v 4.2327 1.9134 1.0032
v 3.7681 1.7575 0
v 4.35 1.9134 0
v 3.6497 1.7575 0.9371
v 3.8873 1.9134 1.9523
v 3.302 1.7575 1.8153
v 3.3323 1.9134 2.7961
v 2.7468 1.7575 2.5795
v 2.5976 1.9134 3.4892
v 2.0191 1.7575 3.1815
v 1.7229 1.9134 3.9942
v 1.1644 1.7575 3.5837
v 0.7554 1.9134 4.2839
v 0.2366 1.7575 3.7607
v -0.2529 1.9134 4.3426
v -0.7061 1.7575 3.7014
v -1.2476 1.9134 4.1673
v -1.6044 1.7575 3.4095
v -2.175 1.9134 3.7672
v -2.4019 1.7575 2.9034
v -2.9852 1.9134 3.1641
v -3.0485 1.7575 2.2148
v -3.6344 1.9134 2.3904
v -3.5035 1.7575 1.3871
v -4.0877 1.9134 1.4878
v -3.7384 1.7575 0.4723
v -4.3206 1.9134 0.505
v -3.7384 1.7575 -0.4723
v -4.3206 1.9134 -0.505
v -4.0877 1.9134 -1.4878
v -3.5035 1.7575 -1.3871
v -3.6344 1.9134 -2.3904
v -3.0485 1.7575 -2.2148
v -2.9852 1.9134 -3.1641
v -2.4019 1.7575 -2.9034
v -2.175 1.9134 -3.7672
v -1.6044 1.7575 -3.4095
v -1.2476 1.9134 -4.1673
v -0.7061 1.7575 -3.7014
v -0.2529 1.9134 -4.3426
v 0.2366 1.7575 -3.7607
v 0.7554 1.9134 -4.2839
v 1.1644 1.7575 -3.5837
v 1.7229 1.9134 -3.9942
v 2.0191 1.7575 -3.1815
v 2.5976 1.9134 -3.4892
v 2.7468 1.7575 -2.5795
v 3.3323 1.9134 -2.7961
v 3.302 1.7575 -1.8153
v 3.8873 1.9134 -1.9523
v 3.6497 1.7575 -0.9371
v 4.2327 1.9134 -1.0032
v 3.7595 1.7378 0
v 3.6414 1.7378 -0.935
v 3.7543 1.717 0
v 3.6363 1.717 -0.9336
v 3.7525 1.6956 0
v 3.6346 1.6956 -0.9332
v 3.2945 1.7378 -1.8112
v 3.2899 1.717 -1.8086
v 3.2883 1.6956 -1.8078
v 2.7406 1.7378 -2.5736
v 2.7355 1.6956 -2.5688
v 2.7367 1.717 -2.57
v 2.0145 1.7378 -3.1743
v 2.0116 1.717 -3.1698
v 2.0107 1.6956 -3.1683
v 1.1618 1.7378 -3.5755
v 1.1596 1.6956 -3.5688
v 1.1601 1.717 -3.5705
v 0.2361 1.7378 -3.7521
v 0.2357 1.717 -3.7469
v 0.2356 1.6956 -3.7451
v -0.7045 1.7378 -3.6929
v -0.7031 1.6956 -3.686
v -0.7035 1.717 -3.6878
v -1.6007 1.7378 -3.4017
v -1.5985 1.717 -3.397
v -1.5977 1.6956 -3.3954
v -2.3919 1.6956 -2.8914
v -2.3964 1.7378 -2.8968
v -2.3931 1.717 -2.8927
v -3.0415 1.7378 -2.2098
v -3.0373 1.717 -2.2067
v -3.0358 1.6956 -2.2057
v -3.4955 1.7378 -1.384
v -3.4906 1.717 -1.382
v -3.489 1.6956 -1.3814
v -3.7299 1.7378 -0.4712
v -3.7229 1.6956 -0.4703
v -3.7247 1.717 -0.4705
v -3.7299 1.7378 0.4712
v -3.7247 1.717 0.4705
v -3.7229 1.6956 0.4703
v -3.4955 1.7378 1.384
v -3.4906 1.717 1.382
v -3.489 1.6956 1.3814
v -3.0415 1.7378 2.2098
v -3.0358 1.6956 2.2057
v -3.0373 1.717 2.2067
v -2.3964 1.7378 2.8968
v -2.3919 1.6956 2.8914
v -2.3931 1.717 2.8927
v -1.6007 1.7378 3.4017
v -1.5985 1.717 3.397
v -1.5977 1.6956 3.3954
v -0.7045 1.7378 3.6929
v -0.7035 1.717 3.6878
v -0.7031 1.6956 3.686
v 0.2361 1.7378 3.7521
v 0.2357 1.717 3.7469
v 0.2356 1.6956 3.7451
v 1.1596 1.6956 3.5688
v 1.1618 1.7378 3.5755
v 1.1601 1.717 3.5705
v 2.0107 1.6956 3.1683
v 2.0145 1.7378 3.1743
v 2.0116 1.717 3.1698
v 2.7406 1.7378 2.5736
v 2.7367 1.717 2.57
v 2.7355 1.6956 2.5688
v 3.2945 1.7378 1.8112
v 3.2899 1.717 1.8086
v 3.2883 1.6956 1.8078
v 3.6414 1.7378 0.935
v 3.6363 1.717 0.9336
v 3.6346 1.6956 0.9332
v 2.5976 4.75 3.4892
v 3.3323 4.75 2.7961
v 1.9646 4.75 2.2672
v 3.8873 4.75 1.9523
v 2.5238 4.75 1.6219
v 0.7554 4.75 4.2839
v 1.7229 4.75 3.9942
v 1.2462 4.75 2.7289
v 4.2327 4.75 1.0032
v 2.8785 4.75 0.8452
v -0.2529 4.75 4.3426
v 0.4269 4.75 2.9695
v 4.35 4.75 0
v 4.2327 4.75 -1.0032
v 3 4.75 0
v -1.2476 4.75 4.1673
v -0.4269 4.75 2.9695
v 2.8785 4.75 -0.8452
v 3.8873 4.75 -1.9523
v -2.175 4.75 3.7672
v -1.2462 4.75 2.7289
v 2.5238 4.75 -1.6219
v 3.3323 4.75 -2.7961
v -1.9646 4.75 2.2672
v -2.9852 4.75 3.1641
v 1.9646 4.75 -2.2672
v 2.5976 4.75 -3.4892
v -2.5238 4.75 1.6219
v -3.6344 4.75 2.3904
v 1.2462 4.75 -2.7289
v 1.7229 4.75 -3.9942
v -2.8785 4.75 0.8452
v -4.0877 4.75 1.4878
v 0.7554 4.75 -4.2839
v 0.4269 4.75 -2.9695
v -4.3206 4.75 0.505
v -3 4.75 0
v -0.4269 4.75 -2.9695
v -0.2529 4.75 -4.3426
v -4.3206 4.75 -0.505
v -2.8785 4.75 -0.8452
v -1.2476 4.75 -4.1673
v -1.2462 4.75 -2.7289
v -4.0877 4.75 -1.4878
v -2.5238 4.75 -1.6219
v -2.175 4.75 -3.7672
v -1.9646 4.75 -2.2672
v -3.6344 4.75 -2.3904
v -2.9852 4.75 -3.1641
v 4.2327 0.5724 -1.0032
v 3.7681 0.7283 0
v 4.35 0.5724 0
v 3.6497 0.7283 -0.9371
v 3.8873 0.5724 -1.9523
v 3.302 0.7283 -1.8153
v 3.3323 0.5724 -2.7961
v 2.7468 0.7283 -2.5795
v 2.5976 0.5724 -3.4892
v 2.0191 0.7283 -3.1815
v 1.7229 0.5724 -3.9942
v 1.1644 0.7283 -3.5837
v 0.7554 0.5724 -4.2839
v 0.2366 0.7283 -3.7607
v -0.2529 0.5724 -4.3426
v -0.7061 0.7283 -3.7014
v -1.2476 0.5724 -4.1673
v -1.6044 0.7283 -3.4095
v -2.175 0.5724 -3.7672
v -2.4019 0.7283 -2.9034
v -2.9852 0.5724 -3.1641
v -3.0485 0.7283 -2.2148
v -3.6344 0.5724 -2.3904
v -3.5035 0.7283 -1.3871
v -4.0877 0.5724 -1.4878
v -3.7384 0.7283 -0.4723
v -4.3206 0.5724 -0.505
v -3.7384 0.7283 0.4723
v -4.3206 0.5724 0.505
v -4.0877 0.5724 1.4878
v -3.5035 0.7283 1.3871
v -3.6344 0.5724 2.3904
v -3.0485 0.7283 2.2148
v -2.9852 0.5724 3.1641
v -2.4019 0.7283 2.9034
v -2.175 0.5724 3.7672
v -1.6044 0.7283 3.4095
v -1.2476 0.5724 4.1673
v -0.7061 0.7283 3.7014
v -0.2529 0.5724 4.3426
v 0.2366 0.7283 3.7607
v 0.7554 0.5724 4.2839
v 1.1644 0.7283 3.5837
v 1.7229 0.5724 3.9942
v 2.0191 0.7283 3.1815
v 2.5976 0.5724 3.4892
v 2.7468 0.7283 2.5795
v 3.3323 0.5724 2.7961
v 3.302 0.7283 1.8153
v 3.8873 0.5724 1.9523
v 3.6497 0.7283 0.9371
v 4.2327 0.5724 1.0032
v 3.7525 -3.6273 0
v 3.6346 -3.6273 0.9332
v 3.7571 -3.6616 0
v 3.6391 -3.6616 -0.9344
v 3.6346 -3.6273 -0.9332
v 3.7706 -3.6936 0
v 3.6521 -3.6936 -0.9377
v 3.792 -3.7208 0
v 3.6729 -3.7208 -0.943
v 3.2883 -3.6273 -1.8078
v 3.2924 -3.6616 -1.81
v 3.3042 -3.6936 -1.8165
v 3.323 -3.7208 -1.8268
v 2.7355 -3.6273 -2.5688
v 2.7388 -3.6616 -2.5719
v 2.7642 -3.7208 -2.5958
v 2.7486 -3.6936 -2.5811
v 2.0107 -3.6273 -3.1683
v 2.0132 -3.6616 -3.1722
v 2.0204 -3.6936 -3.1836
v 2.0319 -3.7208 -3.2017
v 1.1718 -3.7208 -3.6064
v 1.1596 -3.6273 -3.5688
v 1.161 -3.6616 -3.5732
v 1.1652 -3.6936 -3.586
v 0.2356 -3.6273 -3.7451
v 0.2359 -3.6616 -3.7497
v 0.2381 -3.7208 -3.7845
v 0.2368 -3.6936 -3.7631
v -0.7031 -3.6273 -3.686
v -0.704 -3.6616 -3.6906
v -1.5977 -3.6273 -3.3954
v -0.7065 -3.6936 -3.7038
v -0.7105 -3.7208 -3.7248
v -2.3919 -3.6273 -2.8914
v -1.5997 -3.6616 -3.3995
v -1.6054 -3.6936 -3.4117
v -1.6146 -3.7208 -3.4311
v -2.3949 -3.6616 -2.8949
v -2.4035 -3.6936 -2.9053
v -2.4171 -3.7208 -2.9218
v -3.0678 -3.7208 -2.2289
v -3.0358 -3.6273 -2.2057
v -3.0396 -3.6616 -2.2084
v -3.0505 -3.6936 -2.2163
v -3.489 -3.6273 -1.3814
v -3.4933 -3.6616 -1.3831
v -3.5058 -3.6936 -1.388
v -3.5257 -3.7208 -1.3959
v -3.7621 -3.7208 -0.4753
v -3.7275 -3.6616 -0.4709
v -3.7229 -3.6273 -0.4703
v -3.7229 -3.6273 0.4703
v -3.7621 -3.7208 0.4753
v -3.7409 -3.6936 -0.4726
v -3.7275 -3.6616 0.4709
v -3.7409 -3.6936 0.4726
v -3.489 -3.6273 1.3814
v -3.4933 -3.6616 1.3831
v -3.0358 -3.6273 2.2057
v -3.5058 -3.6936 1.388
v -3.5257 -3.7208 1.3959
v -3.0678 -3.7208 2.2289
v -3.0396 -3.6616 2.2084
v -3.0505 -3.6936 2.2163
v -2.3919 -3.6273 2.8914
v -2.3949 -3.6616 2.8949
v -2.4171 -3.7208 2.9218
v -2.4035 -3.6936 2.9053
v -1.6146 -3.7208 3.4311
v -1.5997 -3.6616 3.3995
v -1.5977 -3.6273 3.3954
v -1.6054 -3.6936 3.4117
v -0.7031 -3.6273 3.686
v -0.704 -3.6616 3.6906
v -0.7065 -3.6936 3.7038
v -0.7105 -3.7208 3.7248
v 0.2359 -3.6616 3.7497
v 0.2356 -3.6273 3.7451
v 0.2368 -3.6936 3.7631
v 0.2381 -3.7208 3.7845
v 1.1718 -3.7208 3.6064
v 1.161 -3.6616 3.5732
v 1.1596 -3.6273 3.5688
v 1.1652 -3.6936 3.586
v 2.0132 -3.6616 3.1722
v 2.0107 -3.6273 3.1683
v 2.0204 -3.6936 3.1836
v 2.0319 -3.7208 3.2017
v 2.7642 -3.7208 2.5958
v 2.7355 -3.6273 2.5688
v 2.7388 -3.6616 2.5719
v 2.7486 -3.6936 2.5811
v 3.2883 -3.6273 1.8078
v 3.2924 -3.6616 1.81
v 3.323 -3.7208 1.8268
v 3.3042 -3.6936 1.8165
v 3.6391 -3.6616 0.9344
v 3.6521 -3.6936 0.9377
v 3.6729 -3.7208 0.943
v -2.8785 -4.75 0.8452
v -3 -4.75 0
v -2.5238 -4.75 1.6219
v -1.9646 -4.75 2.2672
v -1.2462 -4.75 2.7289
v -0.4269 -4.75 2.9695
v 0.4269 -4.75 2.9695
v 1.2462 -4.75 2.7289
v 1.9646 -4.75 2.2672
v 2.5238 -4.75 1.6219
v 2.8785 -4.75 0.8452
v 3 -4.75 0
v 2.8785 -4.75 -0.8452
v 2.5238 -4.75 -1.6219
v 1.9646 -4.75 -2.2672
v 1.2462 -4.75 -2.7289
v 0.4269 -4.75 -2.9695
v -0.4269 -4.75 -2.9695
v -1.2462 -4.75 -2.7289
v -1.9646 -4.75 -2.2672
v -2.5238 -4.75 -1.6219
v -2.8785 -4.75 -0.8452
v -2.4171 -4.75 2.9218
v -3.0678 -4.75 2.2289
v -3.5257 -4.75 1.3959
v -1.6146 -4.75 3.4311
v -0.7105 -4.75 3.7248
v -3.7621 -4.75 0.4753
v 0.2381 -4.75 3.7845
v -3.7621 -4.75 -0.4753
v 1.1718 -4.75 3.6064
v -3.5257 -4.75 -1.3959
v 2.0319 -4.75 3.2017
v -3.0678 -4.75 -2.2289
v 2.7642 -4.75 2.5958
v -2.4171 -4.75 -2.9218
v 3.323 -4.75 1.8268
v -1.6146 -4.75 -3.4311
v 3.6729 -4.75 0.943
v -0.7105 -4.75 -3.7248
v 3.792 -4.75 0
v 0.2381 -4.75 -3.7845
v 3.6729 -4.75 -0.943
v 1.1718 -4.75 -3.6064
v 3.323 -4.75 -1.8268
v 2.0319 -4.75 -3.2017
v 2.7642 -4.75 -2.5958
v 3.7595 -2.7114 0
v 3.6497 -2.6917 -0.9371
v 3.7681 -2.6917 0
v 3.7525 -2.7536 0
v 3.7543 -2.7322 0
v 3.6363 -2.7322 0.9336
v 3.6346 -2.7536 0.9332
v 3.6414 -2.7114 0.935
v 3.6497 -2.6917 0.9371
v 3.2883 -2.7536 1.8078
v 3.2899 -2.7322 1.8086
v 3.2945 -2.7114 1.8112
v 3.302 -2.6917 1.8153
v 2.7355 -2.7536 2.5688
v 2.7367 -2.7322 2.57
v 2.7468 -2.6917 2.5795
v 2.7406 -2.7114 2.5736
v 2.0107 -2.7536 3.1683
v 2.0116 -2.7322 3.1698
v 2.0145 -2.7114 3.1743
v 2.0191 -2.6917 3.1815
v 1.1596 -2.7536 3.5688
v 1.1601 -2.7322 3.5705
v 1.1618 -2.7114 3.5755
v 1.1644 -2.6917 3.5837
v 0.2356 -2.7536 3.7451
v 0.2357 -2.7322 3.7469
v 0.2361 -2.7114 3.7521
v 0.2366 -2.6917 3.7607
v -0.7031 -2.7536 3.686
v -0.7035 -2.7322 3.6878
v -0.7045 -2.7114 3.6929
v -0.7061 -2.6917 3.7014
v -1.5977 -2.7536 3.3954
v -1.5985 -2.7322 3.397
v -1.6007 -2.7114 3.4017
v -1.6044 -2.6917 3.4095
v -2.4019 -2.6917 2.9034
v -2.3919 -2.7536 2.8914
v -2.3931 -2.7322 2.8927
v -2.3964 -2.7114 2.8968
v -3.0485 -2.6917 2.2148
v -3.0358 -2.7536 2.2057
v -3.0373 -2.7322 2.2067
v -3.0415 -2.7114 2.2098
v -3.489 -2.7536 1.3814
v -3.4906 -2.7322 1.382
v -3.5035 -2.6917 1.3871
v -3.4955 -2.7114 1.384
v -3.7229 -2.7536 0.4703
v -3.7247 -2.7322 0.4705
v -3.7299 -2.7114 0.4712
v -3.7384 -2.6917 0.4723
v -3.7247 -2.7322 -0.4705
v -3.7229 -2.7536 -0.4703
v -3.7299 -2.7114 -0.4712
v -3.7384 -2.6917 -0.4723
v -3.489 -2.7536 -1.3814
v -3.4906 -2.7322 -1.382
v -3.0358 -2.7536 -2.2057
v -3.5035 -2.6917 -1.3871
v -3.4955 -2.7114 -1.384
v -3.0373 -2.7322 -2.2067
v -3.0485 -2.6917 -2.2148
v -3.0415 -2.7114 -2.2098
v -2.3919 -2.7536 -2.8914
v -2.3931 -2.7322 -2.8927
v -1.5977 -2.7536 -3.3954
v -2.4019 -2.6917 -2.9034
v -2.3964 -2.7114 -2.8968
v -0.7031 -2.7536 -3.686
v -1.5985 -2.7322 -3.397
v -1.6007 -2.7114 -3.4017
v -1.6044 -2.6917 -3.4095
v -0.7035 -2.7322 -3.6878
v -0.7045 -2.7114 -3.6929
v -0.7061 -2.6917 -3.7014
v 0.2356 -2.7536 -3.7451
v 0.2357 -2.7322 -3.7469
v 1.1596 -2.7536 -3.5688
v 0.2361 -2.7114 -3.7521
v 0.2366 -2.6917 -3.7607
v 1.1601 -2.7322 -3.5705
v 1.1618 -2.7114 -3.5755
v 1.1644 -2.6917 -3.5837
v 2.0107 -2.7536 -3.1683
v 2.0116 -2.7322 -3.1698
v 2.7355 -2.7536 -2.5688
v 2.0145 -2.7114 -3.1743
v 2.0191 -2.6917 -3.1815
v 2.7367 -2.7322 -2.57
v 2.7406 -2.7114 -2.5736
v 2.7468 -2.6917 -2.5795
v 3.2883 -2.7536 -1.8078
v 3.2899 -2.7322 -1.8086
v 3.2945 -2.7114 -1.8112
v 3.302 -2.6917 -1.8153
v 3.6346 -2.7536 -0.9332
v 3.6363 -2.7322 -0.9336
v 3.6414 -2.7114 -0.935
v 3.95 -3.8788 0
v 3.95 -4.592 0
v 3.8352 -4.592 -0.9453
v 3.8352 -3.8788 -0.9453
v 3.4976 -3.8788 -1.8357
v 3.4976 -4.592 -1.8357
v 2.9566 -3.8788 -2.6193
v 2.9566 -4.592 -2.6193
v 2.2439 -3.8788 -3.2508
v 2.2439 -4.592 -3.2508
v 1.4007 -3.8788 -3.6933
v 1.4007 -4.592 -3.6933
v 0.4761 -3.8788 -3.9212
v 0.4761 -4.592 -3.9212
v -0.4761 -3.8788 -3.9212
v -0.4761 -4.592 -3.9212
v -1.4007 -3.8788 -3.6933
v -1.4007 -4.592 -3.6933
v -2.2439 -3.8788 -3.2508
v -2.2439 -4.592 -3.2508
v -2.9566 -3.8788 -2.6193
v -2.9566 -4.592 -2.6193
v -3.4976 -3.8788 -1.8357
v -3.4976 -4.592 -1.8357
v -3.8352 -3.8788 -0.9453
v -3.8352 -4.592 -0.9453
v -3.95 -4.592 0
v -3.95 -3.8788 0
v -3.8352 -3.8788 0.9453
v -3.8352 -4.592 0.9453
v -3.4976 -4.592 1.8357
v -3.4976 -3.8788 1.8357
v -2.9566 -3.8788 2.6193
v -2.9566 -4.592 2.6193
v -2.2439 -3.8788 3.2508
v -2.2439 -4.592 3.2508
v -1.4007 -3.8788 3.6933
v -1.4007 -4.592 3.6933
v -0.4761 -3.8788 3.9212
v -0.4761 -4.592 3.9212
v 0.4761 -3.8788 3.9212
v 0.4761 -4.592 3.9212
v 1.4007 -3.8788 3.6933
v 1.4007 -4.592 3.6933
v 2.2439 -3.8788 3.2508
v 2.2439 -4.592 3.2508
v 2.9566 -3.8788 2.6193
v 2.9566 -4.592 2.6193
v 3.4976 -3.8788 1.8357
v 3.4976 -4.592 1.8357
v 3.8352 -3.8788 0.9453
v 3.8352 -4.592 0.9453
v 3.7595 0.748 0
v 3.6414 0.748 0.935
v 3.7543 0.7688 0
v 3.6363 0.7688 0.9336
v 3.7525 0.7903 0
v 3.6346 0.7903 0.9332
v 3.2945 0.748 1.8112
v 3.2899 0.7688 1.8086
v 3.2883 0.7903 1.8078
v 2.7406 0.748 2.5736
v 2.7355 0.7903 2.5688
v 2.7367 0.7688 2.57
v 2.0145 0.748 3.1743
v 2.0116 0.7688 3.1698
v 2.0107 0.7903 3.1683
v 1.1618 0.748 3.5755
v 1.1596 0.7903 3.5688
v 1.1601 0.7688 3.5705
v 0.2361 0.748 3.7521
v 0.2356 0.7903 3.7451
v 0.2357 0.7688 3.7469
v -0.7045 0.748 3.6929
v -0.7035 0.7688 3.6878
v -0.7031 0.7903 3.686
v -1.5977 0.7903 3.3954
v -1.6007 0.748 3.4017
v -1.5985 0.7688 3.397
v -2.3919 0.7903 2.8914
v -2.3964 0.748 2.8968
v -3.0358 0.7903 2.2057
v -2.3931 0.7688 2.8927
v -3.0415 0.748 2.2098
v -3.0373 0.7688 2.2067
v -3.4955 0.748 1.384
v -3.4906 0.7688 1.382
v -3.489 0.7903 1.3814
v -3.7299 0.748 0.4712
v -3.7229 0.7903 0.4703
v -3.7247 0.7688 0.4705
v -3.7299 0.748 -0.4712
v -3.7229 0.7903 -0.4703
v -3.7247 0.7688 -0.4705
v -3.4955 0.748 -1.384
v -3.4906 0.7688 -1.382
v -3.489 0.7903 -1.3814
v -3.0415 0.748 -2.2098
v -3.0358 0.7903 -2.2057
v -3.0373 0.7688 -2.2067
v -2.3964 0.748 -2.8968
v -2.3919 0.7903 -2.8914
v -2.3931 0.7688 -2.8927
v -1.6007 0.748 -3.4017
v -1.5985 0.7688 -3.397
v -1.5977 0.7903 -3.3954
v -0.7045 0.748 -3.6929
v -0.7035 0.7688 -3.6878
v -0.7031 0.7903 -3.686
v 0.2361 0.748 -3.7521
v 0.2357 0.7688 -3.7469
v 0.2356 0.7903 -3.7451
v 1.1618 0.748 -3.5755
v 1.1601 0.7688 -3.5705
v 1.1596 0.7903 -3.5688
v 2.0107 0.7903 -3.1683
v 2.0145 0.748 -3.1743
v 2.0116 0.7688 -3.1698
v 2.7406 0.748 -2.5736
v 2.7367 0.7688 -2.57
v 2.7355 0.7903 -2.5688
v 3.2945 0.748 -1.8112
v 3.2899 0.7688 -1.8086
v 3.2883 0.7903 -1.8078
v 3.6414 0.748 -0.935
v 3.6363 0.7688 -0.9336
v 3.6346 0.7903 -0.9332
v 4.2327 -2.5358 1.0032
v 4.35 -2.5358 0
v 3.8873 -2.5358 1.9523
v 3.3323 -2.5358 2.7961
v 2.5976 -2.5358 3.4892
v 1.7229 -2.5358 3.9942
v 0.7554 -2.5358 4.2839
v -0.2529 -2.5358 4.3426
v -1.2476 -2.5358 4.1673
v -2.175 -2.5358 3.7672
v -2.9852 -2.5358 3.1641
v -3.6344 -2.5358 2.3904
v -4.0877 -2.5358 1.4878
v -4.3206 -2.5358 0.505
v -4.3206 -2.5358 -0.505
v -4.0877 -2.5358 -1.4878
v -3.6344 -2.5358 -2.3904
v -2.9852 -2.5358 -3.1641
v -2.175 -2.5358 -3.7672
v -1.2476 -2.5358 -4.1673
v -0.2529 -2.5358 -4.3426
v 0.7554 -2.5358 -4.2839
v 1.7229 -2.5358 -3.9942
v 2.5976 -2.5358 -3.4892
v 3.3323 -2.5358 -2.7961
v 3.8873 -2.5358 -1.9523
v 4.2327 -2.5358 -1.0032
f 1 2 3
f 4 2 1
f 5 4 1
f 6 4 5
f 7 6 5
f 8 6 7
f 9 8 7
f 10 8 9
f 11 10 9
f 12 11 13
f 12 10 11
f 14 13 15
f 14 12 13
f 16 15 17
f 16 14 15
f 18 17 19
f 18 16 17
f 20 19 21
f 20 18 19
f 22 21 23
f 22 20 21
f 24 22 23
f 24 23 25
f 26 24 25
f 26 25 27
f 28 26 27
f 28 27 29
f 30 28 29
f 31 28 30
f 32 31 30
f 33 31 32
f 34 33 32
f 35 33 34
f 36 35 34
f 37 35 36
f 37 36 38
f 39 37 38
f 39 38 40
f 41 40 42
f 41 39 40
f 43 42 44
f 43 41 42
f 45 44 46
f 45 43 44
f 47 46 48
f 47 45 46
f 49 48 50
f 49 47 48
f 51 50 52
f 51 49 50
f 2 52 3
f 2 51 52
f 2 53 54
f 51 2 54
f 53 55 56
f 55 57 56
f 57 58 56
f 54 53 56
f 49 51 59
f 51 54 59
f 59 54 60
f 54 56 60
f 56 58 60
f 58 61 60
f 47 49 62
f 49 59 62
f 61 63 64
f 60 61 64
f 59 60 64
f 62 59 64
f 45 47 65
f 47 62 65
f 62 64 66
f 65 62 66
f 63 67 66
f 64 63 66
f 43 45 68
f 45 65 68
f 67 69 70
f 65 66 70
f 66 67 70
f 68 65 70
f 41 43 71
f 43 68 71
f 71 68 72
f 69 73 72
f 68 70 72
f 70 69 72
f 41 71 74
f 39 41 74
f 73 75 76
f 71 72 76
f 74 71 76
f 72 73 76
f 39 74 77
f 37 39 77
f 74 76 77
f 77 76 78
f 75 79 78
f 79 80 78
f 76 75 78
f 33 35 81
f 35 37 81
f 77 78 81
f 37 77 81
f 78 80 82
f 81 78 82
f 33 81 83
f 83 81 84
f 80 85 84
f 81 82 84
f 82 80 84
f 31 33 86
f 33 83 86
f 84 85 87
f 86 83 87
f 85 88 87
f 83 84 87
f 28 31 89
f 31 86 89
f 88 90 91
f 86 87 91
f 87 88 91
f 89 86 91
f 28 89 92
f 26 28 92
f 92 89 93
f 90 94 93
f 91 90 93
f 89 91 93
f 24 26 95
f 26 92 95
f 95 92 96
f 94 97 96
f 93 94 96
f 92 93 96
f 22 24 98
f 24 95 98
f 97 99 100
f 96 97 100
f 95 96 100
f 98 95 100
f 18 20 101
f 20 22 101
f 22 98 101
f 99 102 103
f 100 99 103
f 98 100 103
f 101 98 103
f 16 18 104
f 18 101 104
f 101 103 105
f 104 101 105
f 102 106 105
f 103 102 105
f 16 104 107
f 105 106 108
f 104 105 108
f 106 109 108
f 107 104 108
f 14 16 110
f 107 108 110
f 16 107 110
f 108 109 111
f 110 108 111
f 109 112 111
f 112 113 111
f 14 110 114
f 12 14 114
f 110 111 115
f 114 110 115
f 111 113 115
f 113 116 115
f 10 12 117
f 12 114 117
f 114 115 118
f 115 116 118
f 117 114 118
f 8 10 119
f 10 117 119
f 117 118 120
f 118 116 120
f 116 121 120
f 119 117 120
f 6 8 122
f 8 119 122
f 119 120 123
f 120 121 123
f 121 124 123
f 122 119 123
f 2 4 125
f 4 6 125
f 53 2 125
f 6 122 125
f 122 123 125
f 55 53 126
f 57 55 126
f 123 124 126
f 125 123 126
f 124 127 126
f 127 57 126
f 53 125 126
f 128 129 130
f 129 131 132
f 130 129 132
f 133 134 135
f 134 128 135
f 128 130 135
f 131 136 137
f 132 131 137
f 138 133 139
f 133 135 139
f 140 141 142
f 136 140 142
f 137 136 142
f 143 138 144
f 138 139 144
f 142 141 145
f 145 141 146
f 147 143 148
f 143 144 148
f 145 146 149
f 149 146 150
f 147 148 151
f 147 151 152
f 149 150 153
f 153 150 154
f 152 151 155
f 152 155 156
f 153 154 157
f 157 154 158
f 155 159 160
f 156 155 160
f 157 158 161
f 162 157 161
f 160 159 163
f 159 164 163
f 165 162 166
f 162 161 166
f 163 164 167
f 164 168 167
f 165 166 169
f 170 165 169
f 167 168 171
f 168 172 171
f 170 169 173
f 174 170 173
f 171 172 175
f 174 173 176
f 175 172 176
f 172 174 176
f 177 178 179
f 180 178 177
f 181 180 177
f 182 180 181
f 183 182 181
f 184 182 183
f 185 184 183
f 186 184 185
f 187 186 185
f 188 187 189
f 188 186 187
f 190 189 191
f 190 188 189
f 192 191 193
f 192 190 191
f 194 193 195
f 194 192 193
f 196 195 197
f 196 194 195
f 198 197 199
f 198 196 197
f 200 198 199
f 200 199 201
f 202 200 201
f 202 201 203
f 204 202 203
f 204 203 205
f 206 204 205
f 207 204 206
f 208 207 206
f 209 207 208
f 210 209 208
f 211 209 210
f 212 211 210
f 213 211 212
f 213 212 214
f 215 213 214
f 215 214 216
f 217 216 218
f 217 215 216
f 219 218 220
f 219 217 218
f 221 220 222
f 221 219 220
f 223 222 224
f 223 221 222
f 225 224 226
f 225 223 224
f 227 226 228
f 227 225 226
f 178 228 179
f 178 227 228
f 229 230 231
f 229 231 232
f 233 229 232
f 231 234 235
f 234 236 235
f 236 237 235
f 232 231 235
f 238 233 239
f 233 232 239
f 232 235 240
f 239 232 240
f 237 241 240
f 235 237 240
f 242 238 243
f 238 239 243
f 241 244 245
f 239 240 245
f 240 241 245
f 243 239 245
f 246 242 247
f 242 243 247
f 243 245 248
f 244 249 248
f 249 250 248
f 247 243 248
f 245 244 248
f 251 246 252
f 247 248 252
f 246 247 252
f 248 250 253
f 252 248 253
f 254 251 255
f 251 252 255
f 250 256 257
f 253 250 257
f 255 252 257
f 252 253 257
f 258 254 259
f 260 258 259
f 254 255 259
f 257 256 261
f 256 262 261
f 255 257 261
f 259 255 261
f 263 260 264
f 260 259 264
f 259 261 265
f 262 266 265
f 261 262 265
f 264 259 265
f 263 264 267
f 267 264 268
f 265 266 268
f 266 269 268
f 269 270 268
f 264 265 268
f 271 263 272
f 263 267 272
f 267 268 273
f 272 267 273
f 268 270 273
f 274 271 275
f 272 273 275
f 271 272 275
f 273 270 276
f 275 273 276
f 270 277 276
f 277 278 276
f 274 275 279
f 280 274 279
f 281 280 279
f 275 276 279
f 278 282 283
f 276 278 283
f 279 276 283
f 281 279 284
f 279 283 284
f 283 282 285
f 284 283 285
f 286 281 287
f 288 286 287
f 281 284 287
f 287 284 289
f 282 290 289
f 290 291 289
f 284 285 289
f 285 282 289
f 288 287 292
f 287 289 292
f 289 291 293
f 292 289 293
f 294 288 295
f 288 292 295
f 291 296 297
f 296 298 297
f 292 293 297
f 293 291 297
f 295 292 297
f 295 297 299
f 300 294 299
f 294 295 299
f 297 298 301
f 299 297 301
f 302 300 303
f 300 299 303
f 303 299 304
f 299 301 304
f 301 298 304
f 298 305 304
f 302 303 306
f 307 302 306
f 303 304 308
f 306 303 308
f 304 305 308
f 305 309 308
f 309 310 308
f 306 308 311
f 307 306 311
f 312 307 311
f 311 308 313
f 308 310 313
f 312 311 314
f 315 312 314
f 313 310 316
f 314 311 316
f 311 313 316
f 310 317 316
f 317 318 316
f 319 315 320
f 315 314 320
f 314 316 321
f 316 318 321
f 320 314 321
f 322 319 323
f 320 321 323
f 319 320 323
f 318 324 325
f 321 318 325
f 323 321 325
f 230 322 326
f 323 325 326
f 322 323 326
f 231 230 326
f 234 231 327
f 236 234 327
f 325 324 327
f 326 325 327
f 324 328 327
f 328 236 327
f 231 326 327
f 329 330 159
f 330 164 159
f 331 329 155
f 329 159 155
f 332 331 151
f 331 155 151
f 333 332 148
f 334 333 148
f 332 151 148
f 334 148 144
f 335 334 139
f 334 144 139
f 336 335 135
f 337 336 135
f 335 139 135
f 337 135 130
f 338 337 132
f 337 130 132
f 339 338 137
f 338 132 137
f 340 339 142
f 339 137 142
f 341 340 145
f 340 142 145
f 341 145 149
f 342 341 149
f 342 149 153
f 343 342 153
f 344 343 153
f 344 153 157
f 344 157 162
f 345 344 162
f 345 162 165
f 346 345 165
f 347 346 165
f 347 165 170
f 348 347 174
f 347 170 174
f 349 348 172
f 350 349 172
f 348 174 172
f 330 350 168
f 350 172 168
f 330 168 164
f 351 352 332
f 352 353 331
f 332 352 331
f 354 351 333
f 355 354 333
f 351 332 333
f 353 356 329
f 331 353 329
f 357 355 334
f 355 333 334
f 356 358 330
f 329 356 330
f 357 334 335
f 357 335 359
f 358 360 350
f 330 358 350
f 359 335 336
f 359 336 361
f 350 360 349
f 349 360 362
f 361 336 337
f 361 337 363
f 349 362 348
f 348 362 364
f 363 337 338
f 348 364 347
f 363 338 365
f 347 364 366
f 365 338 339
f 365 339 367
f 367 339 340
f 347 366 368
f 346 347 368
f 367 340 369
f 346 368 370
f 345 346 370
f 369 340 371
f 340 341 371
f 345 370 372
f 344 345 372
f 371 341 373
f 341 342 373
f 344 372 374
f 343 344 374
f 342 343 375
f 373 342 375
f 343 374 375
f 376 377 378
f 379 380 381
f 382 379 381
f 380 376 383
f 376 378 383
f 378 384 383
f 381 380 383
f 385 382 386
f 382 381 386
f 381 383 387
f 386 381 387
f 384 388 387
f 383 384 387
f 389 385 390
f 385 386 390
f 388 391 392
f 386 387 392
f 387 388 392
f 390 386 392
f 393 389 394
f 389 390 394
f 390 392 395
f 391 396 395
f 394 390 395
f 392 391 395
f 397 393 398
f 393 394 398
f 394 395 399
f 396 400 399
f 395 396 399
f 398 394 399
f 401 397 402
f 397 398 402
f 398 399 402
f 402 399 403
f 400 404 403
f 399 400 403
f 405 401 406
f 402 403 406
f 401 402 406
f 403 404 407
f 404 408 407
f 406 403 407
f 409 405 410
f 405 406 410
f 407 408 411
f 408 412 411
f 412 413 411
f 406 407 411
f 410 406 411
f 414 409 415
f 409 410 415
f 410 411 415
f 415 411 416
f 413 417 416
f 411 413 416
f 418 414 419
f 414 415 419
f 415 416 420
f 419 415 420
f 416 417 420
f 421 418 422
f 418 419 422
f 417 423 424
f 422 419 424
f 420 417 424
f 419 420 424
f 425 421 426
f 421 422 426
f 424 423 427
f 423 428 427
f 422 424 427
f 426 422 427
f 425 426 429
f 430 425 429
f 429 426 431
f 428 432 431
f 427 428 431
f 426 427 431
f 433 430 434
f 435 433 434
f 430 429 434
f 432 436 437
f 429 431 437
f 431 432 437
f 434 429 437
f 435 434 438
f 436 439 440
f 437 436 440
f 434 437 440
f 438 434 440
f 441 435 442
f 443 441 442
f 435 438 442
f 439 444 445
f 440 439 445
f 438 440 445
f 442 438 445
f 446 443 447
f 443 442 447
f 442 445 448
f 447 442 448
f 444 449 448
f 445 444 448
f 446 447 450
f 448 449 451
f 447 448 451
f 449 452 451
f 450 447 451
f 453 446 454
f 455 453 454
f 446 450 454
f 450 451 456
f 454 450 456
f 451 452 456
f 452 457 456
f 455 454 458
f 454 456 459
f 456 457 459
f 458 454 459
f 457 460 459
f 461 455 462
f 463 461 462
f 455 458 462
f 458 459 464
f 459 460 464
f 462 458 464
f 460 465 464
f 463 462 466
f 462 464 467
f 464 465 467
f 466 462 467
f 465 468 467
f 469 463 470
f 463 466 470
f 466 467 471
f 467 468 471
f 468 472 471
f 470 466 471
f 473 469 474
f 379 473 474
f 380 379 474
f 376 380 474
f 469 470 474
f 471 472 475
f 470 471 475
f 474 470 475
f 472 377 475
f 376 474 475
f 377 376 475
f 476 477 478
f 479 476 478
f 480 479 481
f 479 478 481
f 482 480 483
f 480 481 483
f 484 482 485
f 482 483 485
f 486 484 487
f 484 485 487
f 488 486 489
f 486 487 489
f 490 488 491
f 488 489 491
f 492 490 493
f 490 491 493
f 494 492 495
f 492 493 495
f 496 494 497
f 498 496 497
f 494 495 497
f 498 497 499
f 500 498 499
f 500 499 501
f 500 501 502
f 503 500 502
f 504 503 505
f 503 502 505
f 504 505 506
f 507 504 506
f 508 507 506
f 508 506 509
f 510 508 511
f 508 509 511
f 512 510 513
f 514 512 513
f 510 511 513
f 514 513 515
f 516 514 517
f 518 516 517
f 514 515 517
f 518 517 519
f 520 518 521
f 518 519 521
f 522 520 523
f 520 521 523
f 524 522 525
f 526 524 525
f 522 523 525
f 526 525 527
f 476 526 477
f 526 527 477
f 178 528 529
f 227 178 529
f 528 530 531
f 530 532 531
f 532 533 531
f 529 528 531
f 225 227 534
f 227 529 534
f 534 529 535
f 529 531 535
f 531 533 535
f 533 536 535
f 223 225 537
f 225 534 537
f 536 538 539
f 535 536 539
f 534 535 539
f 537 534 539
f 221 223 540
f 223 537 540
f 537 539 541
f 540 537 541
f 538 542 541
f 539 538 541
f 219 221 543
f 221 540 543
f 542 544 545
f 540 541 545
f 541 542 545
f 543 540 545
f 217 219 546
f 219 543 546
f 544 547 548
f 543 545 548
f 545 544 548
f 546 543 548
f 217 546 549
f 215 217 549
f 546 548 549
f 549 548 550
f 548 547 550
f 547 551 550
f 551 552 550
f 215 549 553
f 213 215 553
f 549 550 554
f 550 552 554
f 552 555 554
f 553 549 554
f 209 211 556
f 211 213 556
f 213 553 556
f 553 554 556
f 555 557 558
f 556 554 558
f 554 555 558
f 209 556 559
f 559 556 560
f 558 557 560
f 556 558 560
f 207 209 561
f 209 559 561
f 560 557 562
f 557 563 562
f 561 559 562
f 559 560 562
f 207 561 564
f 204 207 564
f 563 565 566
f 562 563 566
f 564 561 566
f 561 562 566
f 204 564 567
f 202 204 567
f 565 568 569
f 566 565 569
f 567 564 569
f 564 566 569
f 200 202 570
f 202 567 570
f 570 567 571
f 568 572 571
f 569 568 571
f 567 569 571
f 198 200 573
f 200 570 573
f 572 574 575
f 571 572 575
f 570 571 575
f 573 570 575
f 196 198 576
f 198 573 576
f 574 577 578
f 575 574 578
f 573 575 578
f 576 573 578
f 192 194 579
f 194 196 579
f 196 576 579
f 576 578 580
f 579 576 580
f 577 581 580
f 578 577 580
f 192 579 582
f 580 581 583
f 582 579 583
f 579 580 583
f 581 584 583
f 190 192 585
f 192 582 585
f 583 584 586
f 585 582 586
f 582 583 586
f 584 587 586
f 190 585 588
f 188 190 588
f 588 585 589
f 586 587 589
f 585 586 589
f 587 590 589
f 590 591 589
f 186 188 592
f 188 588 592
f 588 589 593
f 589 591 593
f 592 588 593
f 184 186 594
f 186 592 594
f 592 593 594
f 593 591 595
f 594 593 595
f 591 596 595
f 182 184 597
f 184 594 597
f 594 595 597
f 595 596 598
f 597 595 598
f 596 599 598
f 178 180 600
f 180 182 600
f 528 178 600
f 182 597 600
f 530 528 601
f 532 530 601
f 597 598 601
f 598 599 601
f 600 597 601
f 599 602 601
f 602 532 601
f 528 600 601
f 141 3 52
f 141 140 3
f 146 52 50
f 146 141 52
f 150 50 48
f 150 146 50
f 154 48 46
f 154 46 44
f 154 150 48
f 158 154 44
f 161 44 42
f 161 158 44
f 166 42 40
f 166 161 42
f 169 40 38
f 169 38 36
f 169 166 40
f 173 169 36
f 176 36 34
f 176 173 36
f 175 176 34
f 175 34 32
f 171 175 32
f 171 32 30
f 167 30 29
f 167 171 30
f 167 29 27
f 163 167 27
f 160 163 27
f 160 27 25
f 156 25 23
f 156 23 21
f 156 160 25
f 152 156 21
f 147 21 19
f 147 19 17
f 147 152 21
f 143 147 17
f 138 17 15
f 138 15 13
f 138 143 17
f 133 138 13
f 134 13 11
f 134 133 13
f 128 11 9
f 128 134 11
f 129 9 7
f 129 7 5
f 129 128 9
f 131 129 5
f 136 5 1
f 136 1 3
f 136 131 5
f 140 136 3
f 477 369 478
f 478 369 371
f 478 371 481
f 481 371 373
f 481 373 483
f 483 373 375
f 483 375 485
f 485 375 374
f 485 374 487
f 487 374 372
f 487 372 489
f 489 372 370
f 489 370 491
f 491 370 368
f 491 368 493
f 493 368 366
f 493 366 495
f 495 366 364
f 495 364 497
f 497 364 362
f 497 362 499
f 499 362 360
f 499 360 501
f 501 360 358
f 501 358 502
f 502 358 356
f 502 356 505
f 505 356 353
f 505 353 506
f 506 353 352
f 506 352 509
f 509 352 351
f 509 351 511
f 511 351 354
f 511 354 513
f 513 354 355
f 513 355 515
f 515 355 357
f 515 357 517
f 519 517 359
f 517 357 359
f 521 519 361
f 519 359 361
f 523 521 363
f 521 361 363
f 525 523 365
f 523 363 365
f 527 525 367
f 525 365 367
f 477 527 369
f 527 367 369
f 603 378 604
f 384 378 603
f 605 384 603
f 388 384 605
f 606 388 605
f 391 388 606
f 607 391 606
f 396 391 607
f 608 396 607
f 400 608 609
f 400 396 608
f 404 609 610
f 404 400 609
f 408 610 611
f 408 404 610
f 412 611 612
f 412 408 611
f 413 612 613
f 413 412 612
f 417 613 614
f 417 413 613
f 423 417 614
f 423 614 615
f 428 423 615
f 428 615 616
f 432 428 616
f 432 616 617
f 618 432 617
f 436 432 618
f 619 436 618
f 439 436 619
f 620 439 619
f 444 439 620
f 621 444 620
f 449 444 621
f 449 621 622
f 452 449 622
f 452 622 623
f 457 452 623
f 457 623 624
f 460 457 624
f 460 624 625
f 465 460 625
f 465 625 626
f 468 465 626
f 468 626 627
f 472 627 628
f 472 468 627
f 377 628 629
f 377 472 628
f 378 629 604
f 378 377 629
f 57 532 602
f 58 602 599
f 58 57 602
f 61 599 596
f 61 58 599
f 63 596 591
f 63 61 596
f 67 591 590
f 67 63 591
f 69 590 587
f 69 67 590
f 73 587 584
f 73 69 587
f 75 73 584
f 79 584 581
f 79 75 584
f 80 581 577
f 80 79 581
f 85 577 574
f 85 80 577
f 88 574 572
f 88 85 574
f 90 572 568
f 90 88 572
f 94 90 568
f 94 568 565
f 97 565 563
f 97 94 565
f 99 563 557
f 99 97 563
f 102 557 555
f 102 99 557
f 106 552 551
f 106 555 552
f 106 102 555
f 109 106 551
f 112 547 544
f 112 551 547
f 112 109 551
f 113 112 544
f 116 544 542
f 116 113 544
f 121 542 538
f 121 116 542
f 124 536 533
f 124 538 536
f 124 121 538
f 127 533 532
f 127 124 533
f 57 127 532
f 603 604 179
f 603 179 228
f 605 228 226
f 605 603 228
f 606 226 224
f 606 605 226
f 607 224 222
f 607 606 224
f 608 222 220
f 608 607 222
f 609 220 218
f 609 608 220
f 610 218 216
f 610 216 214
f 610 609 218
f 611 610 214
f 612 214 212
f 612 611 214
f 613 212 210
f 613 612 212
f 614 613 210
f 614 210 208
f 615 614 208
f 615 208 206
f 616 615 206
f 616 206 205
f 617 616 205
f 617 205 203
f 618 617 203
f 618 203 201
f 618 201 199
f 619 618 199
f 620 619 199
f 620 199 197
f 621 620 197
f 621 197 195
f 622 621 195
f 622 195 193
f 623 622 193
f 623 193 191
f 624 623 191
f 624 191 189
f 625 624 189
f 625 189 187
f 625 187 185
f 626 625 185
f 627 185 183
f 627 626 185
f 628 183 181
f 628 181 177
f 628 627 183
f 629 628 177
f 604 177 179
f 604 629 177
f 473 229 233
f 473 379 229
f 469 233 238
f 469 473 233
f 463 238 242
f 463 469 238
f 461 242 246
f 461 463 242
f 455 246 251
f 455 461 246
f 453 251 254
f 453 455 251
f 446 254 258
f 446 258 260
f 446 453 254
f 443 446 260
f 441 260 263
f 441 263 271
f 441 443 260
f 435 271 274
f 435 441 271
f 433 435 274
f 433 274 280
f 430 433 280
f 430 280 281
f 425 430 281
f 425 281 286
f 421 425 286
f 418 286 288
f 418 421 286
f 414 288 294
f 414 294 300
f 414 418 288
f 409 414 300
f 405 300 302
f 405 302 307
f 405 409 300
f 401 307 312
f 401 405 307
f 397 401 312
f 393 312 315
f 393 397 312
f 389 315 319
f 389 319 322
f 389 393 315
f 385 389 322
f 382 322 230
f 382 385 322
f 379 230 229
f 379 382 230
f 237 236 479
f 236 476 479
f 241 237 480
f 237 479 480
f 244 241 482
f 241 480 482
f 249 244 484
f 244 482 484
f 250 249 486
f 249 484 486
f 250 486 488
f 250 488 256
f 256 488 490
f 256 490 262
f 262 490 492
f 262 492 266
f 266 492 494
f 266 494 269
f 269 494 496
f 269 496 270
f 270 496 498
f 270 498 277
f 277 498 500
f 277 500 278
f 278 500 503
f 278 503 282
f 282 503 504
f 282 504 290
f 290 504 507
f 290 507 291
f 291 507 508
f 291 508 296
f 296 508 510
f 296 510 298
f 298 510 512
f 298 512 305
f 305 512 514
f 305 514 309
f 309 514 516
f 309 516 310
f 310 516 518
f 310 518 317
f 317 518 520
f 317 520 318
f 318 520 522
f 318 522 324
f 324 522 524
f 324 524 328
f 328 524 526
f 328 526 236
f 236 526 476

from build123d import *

# Parameters (mm, degrees)
SKETCH3_W                 = 4.35
SKETCH3_H                 = 3.42
SKETCH_PATTERN1_START     = -2.691666667
SKETCH_PATTERN1_OUTLINE_R = 4.35
SKETCH_PATTERN1_DEPTH     = 3.42
SKETCH14_R                = 4.35
CUT_EXTRUDE5_DEPTH        = 0.4275
SKETCH17_OUTSIDE_W        = 88.114
SKETCH17_OUTSIDE_H        = 88.114
SKETCH17_OUTSIDE_R        = 3.768125
CUT_EXTRUDE8_DEPTH        = 9.955029662
CUT_EXTRUDE8_DRAFT        = -75
SKETCH18_OUTSIDE_W        = 82.758
SKETCH18_OUTSIDE_H        = 82.758
SKETCH18_OUTSIDE_R        = 3.768125
CUT_EXTRUDE9_DEPTH        = 9.237544301
CUT_EXTRUDE9_DRAFT        = -75
SKETCH19_OUTSIDE_W        = 93.34
SKETCH19_OUTSIDE_H        = 93.34
SKETCH19_OUTSIDE_R        = 3.768125
CUT_EXTRUDE10_DEPTH       = 10.655226708
CUT_EXTRUDE10_DRAFT       = -75
SKETCH7_R                 = 3
CUT_EXTRUDE1_DEPTH        = 12.317906167
CHAMFER1_SIZE             = 0.158
FILLET2_R                 = 0.1305


# Read off the part's stored shape, not the designer's step: Sketch-Pattern1
with BuildPart() as part:
    # Sketch3 → Revolve1 (revolve)
    with BuildSketch(Plane.XY):
        with Locations((2.175, 3.04)):
            Rectangle(SKETCH3_W, SKETCH3_H)
    revolve(axis=Axis((0, 1.33, 0), (0, 1, 0)))

    # Sketch14 → Cut-Extrude5 (cut)
    with BuildSketch(Plane.XZ.offset(-1.33)):
        Circle(SKETCH14_R)
    extrude(amount=-CUT_EXTRUDE5_DEPTH, mode=Mode.SUBTRACT)


with BuildPart() as body_2:
    # Sketch6 → Revolve2 (revolve)
    with BuildSketch(Plane.XY):
        Polygon((3.7525, 0.728333333), (3.7525, -2.691666667), (3.7525, -3.720833333), (3.95, -3.720833333), (3.95, -4.75), (0, -4.75), (0, 1.7575), (3.7525, 1.7575), align=None)
    revolve(axis=Axis((0, -4.75, 0), (0, 1, 0)))


with BuildPart() as body_3:
    # Sketch-Pattern1 outline → Sketch-Pattern1 (new body)
    with BuildSketch(Plane(origin=(0, 0, 0), x_dir=(1, 0, 0), z_dir=(0, 1, 0)).offset(SKETCH_PATTERN1_START)):
        Circle(SKETCH_PATTERN1_OUTLINE_R)
    extrude(amount=SKETCH_PATTERN1_DEPTH)


with BuildPart() as body_4:
    # Mirror3: mirrored copy
    add(body_3.part.mirror(Plane.XY))


with BuildPart() as cut_extrude8_tool:
    # Sketch17 outside → Cut-Extrude8 (with draft: the straight prism first)
    with BuildSketch(Plane.XZ.offset(-1.7575)):
        Rectangle(SKETCH17_OUTSIDE_W, SKETCH17_OUTSIDE_H)
        Circle(SKETCH17_OUTSIDE_R, mode=Mode.SUBTRACT)
    extrude(amount=-CUT_EXTRUDE8_DEPTH)
    # Cut-Extrude8: the draft: its side faces are tilted about the plane it starts from
    cut_extrude8_sides = [cut_extrude8_tool.faces().sort_by_distance(p)[0] for p in [
        (0, 6.735014831, -44.057),
        (44.057, 6.735014831, 0),
        (0, 6.735014831, 44.057),
        (-44.057, 6.735014831, 0),
        (-3.768125, 6.735014831, 0),
    ]]
    draft(cut_extrude8_sides, Plane.XZ.offset(-1.7575), CUT_EXTRUDE8_DRAFT)


with BuildPart() as part_1:
    add(part.part)

    # Cut-Extrude8: cut by cut_extrude8_tool
    add(cut_extrude8_tool.part, mode=Mode.SUBTRACT)


with BuildPart() as cut_extrude9_tool:
    # Sketch18 outside → Cut-Extrude9 (with draft: the straight prism first)
    with BuildSketch(Plane(origin=(0, 0.728333333, 0), x_dir=(1, 0, 0), z_dir=(0, 1, 0))):
        Rectangle(SKETCH18_OUTSIDE_W, SKETCH18_OUTSIDE_H)
        Circle(SKETCH18_OUTSIDE_R, mode=Mode.SUBTRACT)
    extrude(amount=-CUT_EXTRUDE9_DEPTH)
    # Cut-Extrude9: the draft: its side faces are tilted about the plane it starts from
    cut_extrude9_sides = [cut_extrude9_tool.faces().sort_by_distance(p)[0] for p in [
        (0, -3.890438817, 41.379),
        (41.379, -3.890438817, 0),
        (0, -3.890438817, -41.379),
        (-41.379, -3.890438817, 0),
        (-3.768125, -3.890438817, 0),
    ]]
    draft(cut_extrude9_sides, Plane(origin=(0, 0.728333333, 0), x_dir=(1, 0, 0), z_dir=(0, 1, 0)), CUT_EXTRUDE9_DRAFT)


with BuildPart() as body_4_1:
    add(body_4.part)

    # Cut-Extrude9: cut by cut_extrude9_tool
    add(cut_extrude9_tool.part, mode=Mode.SUBTRACT)


with BuildPart() as cut_extrude10_tool:
    # Sketch19 outside → Cut-Extrude10 (with draft: the straight prism first)
    with BuildSketch(Plane.XZ.offset(2.691666667)):
        Rectangle(SKETCH19_OUTSIDE_W, SKETCH19_OUTSIDE_H)
        Circle(SKETCH19_OUTSIDE_R, mode=Mode.SUBTRACT)
    extrude(amount=-CUT_EXTRUDE10_DEPTH)
    # Cut-Extrude10: the draft: its side faces are tilted about the plane it starts from
    cut_extrude10_sides = [cut_extrude10_tool.faces().sort_by_distance(p)[0] for p in [
        (0, 2.635946687, -46.67),
        (46.67, 2.635946687, 0),
        (0, 2.635946687, 46.67),
        (-46.67, 2.635946687, 0),
        (-3.768125, 2.635946687, 0),
    ]]
    draft(cut_extrude10_sides, Plane.XZ.offset(2.691666667), CUT_EXTRUDE10_DRAFT)


with BuildPart() as body_4_2:
    add(body_4_1.part)

    # Cut-Extrude10: cut by cut_extrude10_tool
    add(cut_extrude10_tool.part, mode=Mode.SUBTRACT)


with BuildPart() as cut_extrude1_tool:
    # Sketch7 → Cut-Extrude1 (new, through all)
    with BuildSketch(Plane(origin=(0, 4.75, 0), x_dir=(1, 0, 0), z_dir=(0, 1, 0))):
        with Locations(Location((0, 0, 0), (0, 0, 180))):
            Circle(SKETCH7_R)
    extrude(amount=-CUT_EXTRUDE1_DEPTH)


with BuildPart() as part_2:
    add(part_1.part)

    # Cut-Extrude1: cut by cut_extrude1_tool
    add(cut_extrude1_tool.part, mode=Mode.SUBTRACT)


with BuildPart() as body_2_1:
    add(body_2.part)

    # Cut-Extrude1: cut by cut_extrude1_tool
    add(cut_extrude1_tool.part, mode=Mode.SUBTRACT)


with BuildPart() as body_4_3:
    add(body_4_2.part)

    # Cut-Extrude1: cut by cut_extrude1_tool
    add(cut_extrude1_tool.part, mode=Mode.SUBTRACT)


with BuildPart() as part_3:
    add(part_2.part)

    # Combine1: union body 4, body 2
    add(body_4_3.part)
    add(body_2_1.part)

    # Chamfer1
    chamfer1_edges = [part_3.edges().sort_by_distance(p)[0] for p in [
        (-3.95, -3.720833333, 0),
        (-3.95, -4.75, 0),
    ]]
    chamfer(chamfer1_edges, length=CHAMFER1_SIZE)

    # Fillet2
    # the kernel refuses this fillet: 0.1305 mm, written as the material it adds along each edge
    with BuildSketch(Plane(origin=(0, 1.7575, 0), x_dir=(1, 0, 0), z_dir=(0, 0, 1))) as fillet2_piece_1:
        with BuildLine():
            CenterArc((3.883, -0.061919176), FILLET2_R, 151.674733073, 28.325266927)
            Line((3.7525, -0.061919176), (3.74989, -0.061919176))
            Line((3.74989, -0.061919176), (3.74989, 0))
            Line((3.74989, 0), (3.7525, 0.00261))
            ThreePointArc((3.7525, 0.00261), (3.7603125, 0.00261), (3.7658275, 0.001238384))
            Line((3.7658275, 0.001238384), (3.768125, 0))
        make_face()
    revolve(axis=Axis((0, 1.7575, 0), (0, 1, 0)))
    with BuildSketch(Plane(origin=(0, -2.691666667, 0), x_dir=(1, 0, 0), z_dir=(0, 0, -1))) as fillet2_piece_2:
        with BuildLine():
            CenterArc((3.883, 0.061919176), FILLET2_R, 180, 28.325266927)
            Line((3.768125, 0), (3.7658275, -0.001238384))
            ThreePointArc((3.7658275, -0.001238384), (3.7603125, -0.00261), (3.7525, -0.00261))
            Line((3.7525, -0.00261), (3.74989, 0))
            Line((3.74989, 0), (3.74989, 0.061919176))
            Line((3.74989, 0.061919176), (3.7525, 0.061919176))
        make_face()
    revolve(axis=Axis((0, -2.691666667, 0), (0, -1, 0)))
    with BuildSketch(Plane(origin=(0, -3.720833333, 0), x_dir=(1, 0, 0), z_dir=(0, 0, 1))) as fillet2_piece_3:
        with BuildLine():
            CenterArc((3.883, 0.093537426), FILLET2_R, 180, 45.78777852)
            Line((3.7525, 0.093537426), (3.74989, 0.093537426))
            Line((3.74989, 0.093537426), (3.74989, 0))
            Line((3.74989, 0), (3.7525, -0.00261))
            ThreePointArc((3.7525, -0.00261), (3.77225, -0.00261), (3.79018, -0.001870749))
            Line((3.79018, -0.001870749), (3.792, 0))
        make_face()
    revolve(axis=Axis((0, -3.720833333, 0), (0, 1, 0)))
    with BuildSketch(Plane(origin=(0, 0.728333333, 0), x_dir=(1, 0, 0), z_dir=(0, 0, -1))) as fillet2_piece_4:
        with BuildLine():
            CenterArc((3.883, -0.061919176), FILLET2_R, 151.674733073, 28.325266927)
            Line((3.768125, 0), (3.7658275, 0.001238383))
            ThreePointArc((3.7658275, 0.001238383), (3.7603125, 0.00261), (3.7525, 0.00261))
            Line((3.7525, 0.00261), (3.74989, 0))
            Line((3.74989, 0), (3.74989, -0.061919176))
            Line((3.74989, -0.061919176), (3.7525, -0.061919176))
        make_face()
    revolve(axis=Axis((0, 0.728333333, 0), (0, -1, 0)))


solid = part_3.part
